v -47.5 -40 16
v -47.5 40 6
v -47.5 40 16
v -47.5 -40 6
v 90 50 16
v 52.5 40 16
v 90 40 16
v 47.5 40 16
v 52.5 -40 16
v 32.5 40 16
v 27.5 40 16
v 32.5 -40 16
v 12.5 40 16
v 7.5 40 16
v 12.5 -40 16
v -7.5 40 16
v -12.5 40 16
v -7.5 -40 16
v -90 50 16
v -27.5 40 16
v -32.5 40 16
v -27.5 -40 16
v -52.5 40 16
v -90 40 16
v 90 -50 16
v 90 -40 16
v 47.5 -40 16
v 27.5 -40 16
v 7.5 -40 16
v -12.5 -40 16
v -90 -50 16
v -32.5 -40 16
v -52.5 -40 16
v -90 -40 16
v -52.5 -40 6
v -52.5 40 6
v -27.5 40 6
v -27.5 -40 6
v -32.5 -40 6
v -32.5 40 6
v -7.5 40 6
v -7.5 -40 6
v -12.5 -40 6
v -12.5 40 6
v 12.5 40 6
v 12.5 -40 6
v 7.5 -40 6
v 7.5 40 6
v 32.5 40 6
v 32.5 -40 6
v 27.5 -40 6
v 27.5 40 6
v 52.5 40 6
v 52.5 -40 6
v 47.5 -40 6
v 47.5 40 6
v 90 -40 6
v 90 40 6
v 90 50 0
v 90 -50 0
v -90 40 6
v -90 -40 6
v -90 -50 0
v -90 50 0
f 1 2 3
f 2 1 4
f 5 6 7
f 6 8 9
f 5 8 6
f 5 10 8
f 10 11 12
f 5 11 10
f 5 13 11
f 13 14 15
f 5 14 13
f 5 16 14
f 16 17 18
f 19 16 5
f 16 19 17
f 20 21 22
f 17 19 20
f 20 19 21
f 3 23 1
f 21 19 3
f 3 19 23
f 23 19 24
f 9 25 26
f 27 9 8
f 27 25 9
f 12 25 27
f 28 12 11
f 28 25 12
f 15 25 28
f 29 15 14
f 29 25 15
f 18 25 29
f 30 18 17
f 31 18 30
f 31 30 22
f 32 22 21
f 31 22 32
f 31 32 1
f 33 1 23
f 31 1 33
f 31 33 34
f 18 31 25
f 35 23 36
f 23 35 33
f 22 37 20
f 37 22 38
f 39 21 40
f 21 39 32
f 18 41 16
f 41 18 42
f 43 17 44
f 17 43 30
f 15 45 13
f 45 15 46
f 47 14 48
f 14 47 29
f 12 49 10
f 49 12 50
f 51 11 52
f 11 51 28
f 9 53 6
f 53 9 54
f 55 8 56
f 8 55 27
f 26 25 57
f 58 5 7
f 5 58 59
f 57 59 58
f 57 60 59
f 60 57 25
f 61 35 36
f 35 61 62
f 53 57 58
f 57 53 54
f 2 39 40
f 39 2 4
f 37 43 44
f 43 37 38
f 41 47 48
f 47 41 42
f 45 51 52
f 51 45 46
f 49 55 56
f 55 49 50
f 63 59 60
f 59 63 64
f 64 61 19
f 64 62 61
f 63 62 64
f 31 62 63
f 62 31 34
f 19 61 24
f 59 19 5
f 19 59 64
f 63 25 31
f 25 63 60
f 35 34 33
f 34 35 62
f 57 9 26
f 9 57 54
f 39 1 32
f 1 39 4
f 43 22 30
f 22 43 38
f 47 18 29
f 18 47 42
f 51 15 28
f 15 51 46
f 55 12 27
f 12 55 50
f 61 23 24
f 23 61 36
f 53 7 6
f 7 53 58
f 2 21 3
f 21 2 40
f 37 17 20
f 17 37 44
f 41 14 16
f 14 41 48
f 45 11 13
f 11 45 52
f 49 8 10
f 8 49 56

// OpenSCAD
$fn = 32;

// ----------------------------------------------------------------------
// Rib frame 180 x 100 x 16
// 6 ribs at 20 mm pitch
// ----------------------------------------------------------------------

// --- parameters (mm) ---
frame = [180, 100, 6];  // base plate size (x, y, z)
rail_w = 10;            // side rail width
ribs = 6;               // number of ribs
rib_t = 5;              // rib thickness
rib_h = 10;             // rib height above the base plate
pitch = 20;             // pitch between rib centres

// --- derived feature positions (mm) ---
span = (ribs - 1) * pitch;          // = 100   distance between the outer ribs
origin_x = -span / 2;               // = -50   X of the first rib
rib_len = frame[1] - 2 * rail_w + 2;  // = 82   rib length, 1 mm into each rail
feature_centers = [
  [origin_x + 0 * pitch, 0],
  [origin_x + 1 * pitch, 0],
  [origin_x + 2 * pitch, 0],
  [origin_x + 3 * pitch, 0],
  [origin_x + 4 * pitch, 0],
  [origin_x + 5 * pitch, 0]
];   // rib centre line, drives the rib loop

// base plate, two side rails, then the ribs read straight off feature_centers
union() {
  translate([-frame[0] / 2, -frame[1] / 2, 0]) cube(frame);
  translate([-frame[0] / 2, -frame[1] / 2, 0]) cube([frame[0], rail_w, frame[2] + rib_h]);
  translate([-frame[0] / 2, frame[1] / 2 - rail_w, 0]) cube([frame[0], rail_w, frame[2] + rib_h]);
  for (centre = feature_centers)
    translate([centre[0] - rib_t / 2, centre[1] - rib_len / 2, frame[2] - 1])
      cube([rib_t, rib_len, rib_h + 1]);
}
